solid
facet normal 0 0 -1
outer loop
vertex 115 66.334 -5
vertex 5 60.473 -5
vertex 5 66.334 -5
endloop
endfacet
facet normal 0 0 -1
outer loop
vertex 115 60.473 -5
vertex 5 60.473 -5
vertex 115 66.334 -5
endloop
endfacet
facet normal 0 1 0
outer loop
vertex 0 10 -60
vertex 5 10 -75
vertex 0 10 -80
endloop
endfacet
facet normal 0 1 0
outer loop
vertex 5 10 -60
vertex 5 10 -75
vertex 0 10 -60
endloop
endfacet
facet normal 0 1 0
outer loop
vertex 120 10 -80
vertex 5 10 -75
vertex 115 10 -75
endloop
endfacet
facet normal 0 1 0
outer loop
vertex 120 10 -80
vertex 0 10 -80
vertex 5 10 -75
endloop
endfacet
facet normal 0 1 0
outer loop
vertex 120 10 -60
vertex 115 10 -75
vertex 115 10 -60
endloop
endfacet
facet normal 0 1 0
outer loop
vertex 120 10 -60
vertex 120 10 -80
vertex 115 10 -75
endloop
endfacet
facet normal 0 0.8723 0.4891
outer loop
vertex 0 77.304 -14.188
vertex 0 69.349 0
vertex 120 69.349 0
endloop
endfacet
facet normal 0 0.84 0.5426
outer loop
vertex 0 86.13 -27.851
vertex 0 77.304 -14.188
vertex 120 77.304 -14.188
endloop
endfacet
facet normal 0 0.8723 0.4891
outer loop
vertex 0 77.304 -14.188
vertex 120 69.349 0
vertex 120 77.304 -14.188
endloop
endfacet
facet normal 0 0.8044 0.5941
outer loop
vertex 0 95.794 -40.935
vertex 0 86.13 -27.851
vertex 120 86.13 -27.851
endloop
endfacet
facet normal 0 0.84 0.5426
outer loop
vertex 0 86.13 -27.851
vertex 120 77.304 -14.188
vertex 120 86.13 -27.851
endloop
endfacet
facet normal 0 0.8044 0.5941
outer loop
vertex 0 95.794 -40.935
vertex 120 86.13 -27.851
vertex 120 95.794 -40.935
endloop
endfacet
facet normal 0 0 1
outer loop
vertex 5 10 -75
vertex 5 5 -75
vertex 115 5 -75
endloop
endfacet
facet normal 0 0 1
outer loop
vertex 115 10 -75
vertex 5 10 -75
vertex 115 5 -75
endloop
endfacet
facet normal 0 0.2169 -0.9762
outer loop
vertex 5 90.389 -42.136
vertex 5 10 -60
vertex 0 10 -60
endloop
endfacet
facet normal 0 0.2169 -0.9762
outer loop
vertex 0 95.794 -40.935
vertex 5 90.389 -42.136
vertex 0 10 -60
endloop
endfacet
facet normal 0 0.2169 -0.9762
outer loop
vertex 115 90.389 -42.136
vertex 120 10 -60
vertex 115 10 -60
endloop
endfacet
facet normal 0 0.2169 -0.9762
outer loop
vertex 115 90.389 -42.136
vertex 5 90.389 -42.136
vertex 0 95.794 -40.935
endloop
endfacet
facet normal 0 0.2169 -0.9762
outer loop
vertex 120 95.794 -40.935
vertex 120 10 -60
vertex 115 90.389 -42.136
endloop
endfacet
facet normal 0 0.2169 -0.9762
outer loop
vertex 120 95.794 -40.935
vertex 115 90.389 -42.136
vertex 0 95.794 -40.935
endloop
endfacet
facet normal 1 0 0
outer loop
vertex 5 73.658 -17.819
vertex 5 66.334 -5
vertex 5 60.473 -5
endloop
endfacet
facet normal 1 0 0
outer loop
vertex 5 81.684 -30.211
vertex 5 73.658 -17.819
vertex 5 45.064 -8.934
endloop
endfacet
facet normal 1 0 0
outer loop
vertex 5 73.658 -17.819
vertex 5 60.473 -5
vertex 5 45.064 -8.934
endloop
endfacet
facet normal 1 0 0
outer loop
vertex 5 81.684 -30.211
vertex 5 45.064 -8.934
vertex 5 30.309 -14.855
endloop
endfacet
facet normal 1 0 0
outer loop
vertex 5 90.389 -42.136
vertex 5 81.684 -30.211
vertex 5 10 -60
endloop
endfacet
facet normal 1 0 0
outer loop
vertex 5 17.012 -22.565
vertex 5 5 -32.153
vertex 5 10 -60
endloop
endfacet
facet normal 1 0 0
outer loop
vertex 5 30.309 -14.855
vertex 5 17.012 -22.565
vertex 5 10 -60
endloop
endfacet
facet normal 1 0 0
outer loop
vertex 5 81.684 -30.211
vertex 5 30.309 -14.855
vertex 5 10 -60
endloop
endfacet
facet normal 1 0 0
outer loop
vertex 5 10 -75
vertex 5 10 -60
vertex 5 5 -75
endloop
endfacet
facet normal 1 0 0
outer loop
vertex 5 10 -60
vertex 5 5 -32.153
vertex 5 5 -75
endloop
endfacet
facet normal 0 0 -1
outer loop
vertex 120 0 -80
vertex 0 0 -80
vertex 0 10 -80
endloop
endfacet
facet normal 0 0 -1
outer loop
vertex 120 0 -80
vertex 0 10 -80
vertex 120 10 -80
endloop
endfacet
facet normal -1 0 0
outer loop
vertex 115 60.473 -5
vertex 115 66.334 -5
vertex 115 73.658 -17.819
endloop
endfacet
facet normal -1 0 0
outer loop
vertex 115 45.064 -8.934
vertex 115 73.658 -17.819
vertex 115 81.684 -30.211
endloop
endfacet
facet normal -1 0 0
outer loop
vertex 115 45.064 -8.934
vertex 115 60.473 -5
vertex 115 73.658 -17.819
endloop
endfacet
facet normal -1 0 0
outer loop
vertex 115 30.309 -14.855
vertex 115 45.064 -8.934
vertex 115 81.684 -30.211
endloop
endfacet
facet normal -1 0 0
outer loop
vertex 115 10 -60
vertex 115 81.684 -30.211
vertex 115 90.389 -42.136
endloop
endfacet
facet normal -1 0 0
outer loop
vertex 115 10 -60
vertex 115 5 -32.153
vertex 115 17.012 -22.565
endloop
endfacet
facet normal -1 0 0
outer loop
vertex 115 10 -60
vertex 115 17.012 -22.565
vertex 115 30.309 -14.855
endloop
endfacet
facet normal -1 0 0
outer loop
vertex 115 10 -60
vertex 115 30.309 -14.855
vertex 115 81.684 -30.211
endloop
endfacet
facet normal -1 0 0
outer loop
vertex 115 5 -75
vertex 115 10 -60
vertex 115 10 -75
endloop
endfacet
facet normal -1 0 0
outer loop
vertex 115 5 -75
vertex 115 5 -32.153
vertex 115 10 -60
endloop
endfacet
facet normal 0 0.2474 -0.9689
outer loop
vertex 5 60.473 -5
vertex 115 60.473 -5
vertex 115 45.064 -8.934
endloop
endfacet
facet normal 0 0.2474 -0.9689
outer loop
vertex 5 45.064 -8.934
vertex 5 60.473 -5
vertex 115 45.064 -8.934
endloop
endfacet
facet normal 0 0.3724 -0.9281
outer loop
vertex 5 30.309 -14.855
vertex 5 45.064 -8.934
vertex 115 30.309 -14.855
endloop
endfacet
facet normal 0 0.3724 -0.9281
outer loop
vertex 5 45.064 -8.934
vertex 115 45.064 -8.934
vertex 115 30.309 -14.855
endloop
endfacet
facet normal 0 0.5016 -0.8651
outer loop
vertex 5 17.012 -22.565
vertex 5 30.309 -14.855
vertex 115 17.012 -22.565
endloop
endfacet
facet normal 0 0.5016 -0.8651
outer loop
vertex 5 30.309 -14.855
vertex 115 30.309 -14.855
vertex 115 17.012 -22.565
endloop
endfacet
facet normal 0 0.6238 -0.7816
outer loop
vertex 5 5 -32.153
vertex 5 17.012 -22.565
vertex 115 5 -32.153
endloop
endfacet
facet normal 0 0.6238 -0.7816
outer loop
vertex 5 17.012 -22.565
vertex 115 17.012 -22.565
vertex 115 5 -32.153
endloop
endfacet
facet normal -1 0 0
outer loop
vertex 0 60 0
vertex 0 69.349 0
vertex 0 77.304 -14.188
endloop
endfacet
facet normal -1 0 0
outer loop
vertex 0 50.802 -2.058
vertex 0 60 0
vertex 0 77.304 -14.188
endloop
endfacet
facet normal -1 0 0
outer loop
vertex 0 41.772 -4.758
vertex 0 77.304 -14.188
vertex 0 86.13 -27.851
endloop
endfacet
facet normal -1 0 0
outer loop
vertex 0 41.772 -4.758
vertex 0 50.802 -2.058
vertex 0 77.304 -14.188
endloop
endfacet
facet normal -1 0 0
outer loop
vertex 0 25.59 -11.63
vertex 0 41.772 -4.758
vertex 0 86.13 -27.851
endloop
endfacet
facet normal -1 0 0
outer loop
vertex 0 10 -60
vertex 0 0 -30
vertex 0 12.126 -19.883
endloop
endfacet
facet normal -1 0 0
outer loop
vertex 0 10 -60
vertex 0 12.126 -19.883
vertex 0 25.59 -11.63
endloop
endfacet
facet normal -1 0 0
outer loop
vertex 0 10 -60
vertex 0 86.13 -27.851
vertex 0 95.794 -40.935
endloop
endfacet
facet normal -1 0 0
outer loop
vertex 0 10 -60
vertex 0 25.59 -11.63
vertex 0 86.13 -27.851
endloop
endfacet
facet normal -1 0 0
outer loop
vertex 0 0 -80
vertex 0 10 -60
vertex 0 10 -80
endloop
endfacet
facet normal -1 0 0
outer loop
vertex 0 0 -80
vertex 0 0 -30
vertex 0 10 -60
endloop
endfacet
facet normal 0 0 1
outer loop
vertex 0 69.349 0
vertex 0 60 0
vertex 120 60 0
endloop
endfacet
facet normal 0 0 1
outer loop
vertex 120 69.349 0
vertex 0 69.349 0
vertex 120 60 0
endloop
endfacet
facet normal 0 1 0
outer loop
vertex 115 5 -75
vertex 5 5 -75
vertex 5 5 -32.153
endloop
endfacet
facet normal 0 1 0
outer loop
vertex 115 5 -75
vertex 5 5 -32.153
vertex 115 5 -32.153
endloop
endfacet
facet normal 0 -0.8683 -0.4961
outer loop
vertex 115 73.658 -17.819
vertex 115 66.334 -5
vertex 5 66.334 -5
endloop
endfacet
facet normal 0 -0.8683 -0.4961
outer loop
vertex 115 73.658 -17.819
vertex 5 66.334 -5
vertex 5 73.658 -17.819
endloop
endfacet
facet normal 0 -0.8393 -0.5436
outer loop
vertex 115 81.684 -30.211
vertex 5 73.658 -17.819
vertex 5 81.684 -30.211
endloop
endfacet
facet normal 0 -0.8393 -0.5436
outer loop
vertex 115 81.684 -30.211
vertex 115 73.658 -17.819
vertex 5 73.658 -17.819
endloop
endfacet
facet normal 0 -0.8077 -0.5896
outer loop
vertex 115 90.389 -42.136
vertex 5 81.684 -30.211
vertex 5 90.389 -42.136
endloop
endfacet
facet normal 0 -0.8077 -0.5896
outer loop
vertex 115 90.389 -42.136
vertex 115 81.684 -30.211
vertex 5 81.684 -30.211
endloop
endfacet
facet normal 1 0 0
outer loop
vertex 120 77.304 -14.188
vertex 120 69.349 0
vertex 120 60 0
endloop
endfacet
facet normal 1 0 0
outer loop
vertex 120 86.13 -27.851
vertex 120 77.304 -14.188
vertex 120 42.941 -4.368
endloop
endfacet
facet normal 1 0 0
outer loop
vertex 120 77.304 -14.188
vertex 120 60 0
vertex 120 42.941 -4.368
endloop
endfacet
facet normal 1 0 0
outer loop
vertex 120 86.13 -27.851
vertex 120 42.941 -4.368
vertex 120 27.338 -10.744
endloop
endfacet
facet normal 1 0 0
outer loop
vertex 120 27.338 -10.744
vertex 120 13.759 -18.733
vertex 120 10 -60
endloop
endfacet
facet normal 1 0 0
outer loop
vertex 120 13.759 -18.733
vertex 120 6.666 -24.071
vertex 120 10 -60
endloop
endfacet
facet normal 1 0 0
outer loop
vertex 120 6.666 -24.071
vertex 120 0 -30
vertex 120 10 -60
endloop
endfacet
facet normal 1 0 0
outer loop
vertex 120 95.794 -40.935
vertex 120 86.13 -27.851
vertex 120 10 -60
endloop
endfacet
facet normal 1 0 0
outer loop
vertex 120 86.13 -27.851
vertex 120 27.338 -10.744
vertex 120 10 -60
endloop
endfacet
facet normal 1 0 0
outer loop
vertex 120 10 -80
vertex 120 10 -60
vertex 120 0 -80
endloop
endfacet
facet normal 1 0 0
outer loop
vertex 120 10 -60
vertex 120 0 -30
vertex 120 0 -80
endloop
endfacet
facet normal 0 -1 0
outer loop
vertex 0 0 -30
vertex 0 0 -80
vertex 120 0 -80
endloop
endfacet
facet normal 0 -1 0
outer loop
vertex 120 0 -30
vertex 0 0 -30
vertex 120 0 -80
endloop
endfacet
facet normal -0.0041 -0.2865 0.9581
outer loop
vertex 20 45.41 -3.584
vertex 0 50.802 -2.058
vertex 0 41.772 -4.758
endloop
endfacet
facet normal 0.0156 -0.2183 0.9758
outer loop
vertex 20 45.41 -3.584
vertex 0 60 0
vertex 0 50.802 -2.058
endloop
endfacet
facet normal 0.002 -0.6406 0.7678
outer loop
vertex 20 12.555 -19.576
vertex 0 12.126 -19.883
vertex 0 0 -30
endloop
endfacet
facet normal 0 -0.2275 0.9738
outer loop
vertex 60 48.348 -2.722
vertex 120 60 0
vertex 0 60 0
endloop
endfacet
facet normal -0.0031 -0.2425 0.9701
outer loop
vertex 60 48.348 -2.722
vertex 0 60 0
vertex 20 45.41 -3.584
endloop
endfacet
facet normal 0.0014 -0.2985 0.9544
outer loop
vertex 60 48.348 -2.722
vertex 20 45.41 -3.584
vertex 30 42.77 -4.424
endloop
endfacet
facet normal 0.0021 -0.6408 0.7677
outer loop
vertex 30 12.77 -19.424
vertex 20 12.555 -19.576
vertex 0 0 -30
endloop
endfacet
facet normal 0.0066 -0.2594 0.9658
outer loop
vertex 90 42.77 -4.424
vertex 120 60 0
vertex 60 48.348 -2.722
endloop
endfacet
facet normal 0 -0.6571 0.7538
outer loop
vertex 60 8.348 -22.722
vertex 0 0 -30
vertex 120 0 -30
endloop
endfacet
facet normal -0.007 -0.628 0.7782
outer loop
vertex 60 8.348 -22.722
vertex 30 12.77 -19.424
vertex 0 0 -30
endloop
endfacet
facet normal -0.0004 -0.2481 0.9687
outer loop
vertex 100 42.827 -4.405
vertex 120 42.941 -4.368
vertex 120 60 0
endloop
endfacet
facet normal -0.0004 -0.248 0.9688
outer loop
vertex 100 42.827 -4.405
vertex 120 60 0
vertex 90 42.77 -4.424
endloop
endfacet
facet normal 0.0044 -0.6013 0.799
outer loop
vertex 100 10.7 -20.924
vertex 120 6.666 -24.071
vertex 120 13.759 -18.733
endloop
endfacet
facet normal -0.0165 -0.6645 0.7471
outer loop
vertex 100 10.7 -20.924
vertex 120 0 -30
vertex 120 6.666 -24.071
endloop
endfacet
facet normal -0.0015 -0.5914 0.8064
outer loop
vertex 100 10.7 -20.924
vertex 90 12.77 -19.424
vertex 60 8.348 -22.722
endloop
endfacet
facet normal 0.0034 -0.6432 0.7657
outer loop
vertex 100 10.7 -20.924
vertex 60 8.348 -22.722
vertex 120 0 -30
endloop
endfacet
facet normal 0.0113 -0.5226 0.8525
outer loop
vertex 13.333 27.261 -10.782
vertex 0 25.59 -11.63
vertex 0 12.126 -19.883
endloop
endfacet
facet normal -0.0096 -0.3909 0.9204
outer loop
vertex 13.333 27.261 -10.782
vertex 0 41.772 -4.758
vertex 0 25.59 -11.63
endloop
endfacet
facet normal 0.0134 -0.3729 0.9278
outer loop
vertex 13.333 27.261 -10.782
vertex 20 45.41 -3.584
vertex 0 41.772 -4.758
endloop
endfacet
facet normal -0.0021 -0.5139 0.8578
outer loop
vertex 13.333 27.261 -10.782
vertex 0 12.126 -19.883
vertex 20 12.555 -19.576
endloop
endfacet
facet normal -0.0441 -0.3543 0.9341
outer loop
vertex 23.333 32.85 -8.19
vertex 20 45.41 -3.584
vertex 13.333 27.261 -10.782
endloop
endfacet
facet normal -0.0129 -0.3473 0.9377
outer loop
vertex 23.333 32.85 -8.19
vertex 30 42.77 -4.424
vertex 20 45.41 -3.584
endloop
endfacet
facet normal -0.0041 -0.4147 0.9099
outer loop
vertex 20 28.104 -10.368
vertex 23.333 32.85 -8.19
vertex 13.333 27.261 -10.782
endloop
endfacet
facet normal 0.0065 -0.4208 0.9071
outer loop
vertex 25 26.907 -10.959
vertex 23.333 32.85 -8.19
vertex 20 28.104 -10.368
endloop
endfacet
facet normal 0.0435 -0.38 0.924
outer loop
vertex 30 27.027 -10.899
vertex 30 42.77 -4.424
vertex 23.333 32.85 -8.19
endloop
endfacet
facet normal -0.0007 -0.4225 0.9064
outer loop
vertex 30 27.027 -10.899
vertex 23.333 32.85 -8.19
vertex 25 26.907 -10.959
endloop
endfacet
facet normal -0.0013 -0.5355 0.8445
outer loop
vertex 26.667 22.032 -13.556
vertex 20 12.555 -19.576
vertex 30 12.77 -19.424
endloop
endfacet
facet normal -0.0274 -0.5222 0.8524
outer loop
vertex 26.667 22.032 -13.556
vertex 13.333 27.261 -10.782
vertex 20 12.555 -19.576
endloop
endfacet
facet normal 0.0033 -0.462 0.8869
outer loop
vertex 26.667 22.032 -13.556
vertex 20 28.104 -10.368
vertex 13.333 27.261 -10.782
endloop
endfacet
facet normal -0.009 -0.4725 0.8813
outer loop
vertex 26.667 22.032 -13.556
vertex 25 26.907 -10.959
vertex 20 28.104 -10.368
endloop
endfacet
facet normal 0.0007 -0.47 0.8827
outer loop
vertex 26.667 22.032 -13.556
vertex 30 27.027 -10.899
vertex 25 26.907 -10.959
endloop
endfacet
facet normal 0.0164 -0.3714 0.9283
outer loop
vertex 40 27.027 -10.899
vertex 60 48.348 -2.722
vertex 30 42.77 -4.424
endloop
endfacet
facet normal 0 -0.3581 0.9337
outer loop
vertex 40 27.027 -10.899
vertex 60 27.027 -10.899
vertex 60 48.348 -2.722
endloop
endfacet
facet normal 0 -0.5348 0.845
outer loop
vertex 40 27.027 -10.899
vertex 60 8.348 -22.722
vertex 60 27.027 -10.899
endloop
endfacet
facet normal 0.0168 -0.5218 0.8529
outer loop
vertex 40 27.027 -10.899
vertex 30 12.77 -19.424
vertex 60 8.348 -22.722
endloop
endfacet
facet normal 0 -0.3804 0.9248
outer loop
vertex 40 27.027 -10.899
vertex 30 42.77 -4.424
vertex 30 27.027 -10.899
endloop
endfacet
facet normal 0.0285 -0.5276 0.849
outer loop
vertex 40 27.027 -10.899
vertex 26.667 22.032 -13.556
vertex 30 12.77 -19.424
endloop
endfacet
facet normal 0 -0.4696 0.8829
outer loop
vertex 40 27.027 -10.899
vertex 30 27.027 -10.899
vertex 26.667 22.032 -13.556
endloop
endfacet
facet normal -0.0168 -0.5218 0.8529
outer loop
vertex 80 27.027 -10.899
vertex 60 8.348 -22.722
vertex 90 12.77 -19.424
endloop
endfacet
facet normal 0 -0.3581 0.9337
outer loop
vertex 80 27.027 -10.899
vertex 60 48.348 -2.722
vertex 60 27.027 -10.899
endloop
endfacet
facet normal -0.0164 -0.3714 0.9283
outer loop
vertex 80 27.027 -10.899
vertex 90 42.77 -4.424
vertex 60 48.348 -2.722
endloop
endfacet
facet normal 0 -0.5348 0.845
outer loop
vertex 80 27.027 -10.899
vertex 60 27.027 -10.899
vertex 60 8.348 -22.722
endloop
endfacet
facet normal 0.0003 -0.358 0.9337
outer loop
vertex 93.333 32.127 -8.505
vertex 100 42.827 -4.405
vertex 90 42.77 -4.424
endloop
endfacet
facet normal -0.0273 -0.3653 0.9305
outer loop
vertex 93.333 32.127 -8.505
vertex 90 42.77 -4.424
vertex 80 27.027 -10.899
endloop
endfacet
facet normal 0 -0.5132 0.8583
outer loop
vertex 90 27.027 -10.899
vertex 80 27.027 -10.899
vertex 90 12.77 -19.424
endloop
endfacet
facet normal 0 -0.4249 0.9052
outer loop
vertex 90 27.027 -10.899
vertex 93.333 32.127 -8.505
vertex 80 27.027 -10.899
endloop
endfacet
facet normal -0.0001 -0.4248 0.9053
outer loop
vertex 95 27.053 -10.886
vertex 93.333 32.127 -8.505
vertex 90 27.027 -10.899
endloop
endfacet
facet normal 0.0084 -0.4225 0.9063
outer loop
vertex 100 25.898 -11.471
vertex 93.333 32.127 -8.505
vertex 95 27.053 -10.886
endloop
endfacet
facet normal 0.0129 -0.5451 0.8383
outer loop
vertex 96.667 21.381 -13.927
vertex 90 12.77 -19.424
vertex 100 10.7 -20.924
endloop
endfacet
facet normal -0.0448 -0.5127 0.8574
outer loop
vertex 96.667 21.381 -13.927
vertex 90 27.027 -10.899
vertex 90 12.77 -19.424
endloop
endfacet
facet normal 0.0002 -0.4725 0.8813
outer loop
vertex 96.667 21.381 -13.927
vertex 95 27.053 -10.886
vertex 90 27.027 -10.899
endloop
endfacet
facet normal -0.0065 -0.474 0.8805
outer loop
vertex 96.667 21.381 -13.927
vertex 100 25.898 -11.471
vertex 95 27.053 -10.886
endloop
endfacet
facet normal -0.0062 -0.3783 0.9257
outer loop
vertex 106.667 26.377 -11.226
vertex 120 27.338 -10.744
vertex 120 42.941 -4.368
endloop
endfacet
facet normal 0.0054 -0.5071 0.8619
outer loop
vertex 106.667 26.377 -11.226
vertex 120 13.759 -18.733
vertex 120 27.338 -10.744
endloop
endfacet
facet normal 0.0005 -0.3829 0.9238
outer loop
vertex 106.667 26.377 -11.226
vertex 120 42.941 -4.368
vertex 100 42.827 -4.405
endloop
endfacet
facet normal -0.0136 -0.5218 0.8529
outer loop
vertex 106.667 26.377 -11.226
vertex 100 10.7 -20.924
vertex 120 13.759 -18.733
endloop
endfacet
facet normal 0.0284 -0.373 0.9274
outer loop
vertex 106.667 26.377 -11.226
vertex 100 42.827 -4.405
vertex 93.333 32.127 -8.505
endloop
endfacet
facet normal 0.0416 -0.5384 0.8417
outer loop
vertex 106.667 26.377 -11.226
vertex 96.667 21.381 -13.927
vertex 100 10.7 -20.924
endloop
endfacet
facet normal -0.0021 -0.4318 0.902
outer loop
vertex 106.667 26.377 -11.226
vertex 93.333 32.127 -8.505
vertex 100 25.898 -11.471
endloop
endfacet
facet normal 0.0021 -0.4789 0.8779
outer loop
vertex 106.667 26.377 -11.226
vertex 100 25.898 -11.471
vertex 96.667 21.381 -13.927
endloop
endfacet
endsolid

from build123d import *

# Parameters (mm, degrees)
SKETCH1_W           = 120
SKETCH1_H           = 80
BOSS_EXTRUDE1_DEPTH = 100
CUT_EXTRUDE1_DEPTH  = 176.499287748
SKETCH3_R           = 260
CUT_EXTRUDE2_DEPTH  = 176.499287919
SHELL1_T            = -5


with BuildPart() as part:
    # Sketch1 → Boss-Extrude1 (new body)
    with BuildSketch(Plane(origin=(0, 0, 0), x_dir=(1, 0, 0), z_dir=(0, 1, 0))):
        with Locations((60, 40)):
            Rectangle(SKETCH1_W, SKETCH1_H)
    extrude(amount=BOSS_EXTRUDE1_DEPTH)

    # Sketch2 → Cut-Extrude1 (cut, through all)
    with BuildSketch(Plane(origin=(120, 0, 0), x_dir=(0, 0, -1), z_dir=(1, 0, 0))):
        Polygon((80, 10), (60, 10), (40, 100), (80, 100), align=None)
        with BuildLine():
            Line((0, 60), (0, 0))
            Line((0, 0), (30, 0))
            add(Edge.make_bspline(
                [(0, 60), (6.797454451, 24.053758825), (30, 0)],
                knots=[0, 0, 0, 0.927202308, 0.927202308, 0.927202308], degree=2))
        make_face()
    extrude(amount=-CUT_EXTRUDE1_DEPTH, mode=Mode.SUBTRACT)

    # Sketch3 → Cut-Extrude2 (cut, through all)
    with BuildSketch(Plane(origin=(120, 0, 0), x_dir=(0, 0, -1), z_dir=(1, 0, 0))):
        with Locations((-120, 300)):
            Circle(SKETCH3_R)
    extrude(amount=-CUT_EXTRUDE2_DEPTH, mode=Mode.SUBTRACT)

    # Shell1
    shell1_openings = [part.faces().sort_by_distance(p)[0] for p in [
        (60, 10, -70),
        (60, 52.897059769, -50.467320051),
    ]]
    offset(amount=SHELL1_T, openings=shell1_openings, kind=Kind.INTERSECTION)


solid = part.part
